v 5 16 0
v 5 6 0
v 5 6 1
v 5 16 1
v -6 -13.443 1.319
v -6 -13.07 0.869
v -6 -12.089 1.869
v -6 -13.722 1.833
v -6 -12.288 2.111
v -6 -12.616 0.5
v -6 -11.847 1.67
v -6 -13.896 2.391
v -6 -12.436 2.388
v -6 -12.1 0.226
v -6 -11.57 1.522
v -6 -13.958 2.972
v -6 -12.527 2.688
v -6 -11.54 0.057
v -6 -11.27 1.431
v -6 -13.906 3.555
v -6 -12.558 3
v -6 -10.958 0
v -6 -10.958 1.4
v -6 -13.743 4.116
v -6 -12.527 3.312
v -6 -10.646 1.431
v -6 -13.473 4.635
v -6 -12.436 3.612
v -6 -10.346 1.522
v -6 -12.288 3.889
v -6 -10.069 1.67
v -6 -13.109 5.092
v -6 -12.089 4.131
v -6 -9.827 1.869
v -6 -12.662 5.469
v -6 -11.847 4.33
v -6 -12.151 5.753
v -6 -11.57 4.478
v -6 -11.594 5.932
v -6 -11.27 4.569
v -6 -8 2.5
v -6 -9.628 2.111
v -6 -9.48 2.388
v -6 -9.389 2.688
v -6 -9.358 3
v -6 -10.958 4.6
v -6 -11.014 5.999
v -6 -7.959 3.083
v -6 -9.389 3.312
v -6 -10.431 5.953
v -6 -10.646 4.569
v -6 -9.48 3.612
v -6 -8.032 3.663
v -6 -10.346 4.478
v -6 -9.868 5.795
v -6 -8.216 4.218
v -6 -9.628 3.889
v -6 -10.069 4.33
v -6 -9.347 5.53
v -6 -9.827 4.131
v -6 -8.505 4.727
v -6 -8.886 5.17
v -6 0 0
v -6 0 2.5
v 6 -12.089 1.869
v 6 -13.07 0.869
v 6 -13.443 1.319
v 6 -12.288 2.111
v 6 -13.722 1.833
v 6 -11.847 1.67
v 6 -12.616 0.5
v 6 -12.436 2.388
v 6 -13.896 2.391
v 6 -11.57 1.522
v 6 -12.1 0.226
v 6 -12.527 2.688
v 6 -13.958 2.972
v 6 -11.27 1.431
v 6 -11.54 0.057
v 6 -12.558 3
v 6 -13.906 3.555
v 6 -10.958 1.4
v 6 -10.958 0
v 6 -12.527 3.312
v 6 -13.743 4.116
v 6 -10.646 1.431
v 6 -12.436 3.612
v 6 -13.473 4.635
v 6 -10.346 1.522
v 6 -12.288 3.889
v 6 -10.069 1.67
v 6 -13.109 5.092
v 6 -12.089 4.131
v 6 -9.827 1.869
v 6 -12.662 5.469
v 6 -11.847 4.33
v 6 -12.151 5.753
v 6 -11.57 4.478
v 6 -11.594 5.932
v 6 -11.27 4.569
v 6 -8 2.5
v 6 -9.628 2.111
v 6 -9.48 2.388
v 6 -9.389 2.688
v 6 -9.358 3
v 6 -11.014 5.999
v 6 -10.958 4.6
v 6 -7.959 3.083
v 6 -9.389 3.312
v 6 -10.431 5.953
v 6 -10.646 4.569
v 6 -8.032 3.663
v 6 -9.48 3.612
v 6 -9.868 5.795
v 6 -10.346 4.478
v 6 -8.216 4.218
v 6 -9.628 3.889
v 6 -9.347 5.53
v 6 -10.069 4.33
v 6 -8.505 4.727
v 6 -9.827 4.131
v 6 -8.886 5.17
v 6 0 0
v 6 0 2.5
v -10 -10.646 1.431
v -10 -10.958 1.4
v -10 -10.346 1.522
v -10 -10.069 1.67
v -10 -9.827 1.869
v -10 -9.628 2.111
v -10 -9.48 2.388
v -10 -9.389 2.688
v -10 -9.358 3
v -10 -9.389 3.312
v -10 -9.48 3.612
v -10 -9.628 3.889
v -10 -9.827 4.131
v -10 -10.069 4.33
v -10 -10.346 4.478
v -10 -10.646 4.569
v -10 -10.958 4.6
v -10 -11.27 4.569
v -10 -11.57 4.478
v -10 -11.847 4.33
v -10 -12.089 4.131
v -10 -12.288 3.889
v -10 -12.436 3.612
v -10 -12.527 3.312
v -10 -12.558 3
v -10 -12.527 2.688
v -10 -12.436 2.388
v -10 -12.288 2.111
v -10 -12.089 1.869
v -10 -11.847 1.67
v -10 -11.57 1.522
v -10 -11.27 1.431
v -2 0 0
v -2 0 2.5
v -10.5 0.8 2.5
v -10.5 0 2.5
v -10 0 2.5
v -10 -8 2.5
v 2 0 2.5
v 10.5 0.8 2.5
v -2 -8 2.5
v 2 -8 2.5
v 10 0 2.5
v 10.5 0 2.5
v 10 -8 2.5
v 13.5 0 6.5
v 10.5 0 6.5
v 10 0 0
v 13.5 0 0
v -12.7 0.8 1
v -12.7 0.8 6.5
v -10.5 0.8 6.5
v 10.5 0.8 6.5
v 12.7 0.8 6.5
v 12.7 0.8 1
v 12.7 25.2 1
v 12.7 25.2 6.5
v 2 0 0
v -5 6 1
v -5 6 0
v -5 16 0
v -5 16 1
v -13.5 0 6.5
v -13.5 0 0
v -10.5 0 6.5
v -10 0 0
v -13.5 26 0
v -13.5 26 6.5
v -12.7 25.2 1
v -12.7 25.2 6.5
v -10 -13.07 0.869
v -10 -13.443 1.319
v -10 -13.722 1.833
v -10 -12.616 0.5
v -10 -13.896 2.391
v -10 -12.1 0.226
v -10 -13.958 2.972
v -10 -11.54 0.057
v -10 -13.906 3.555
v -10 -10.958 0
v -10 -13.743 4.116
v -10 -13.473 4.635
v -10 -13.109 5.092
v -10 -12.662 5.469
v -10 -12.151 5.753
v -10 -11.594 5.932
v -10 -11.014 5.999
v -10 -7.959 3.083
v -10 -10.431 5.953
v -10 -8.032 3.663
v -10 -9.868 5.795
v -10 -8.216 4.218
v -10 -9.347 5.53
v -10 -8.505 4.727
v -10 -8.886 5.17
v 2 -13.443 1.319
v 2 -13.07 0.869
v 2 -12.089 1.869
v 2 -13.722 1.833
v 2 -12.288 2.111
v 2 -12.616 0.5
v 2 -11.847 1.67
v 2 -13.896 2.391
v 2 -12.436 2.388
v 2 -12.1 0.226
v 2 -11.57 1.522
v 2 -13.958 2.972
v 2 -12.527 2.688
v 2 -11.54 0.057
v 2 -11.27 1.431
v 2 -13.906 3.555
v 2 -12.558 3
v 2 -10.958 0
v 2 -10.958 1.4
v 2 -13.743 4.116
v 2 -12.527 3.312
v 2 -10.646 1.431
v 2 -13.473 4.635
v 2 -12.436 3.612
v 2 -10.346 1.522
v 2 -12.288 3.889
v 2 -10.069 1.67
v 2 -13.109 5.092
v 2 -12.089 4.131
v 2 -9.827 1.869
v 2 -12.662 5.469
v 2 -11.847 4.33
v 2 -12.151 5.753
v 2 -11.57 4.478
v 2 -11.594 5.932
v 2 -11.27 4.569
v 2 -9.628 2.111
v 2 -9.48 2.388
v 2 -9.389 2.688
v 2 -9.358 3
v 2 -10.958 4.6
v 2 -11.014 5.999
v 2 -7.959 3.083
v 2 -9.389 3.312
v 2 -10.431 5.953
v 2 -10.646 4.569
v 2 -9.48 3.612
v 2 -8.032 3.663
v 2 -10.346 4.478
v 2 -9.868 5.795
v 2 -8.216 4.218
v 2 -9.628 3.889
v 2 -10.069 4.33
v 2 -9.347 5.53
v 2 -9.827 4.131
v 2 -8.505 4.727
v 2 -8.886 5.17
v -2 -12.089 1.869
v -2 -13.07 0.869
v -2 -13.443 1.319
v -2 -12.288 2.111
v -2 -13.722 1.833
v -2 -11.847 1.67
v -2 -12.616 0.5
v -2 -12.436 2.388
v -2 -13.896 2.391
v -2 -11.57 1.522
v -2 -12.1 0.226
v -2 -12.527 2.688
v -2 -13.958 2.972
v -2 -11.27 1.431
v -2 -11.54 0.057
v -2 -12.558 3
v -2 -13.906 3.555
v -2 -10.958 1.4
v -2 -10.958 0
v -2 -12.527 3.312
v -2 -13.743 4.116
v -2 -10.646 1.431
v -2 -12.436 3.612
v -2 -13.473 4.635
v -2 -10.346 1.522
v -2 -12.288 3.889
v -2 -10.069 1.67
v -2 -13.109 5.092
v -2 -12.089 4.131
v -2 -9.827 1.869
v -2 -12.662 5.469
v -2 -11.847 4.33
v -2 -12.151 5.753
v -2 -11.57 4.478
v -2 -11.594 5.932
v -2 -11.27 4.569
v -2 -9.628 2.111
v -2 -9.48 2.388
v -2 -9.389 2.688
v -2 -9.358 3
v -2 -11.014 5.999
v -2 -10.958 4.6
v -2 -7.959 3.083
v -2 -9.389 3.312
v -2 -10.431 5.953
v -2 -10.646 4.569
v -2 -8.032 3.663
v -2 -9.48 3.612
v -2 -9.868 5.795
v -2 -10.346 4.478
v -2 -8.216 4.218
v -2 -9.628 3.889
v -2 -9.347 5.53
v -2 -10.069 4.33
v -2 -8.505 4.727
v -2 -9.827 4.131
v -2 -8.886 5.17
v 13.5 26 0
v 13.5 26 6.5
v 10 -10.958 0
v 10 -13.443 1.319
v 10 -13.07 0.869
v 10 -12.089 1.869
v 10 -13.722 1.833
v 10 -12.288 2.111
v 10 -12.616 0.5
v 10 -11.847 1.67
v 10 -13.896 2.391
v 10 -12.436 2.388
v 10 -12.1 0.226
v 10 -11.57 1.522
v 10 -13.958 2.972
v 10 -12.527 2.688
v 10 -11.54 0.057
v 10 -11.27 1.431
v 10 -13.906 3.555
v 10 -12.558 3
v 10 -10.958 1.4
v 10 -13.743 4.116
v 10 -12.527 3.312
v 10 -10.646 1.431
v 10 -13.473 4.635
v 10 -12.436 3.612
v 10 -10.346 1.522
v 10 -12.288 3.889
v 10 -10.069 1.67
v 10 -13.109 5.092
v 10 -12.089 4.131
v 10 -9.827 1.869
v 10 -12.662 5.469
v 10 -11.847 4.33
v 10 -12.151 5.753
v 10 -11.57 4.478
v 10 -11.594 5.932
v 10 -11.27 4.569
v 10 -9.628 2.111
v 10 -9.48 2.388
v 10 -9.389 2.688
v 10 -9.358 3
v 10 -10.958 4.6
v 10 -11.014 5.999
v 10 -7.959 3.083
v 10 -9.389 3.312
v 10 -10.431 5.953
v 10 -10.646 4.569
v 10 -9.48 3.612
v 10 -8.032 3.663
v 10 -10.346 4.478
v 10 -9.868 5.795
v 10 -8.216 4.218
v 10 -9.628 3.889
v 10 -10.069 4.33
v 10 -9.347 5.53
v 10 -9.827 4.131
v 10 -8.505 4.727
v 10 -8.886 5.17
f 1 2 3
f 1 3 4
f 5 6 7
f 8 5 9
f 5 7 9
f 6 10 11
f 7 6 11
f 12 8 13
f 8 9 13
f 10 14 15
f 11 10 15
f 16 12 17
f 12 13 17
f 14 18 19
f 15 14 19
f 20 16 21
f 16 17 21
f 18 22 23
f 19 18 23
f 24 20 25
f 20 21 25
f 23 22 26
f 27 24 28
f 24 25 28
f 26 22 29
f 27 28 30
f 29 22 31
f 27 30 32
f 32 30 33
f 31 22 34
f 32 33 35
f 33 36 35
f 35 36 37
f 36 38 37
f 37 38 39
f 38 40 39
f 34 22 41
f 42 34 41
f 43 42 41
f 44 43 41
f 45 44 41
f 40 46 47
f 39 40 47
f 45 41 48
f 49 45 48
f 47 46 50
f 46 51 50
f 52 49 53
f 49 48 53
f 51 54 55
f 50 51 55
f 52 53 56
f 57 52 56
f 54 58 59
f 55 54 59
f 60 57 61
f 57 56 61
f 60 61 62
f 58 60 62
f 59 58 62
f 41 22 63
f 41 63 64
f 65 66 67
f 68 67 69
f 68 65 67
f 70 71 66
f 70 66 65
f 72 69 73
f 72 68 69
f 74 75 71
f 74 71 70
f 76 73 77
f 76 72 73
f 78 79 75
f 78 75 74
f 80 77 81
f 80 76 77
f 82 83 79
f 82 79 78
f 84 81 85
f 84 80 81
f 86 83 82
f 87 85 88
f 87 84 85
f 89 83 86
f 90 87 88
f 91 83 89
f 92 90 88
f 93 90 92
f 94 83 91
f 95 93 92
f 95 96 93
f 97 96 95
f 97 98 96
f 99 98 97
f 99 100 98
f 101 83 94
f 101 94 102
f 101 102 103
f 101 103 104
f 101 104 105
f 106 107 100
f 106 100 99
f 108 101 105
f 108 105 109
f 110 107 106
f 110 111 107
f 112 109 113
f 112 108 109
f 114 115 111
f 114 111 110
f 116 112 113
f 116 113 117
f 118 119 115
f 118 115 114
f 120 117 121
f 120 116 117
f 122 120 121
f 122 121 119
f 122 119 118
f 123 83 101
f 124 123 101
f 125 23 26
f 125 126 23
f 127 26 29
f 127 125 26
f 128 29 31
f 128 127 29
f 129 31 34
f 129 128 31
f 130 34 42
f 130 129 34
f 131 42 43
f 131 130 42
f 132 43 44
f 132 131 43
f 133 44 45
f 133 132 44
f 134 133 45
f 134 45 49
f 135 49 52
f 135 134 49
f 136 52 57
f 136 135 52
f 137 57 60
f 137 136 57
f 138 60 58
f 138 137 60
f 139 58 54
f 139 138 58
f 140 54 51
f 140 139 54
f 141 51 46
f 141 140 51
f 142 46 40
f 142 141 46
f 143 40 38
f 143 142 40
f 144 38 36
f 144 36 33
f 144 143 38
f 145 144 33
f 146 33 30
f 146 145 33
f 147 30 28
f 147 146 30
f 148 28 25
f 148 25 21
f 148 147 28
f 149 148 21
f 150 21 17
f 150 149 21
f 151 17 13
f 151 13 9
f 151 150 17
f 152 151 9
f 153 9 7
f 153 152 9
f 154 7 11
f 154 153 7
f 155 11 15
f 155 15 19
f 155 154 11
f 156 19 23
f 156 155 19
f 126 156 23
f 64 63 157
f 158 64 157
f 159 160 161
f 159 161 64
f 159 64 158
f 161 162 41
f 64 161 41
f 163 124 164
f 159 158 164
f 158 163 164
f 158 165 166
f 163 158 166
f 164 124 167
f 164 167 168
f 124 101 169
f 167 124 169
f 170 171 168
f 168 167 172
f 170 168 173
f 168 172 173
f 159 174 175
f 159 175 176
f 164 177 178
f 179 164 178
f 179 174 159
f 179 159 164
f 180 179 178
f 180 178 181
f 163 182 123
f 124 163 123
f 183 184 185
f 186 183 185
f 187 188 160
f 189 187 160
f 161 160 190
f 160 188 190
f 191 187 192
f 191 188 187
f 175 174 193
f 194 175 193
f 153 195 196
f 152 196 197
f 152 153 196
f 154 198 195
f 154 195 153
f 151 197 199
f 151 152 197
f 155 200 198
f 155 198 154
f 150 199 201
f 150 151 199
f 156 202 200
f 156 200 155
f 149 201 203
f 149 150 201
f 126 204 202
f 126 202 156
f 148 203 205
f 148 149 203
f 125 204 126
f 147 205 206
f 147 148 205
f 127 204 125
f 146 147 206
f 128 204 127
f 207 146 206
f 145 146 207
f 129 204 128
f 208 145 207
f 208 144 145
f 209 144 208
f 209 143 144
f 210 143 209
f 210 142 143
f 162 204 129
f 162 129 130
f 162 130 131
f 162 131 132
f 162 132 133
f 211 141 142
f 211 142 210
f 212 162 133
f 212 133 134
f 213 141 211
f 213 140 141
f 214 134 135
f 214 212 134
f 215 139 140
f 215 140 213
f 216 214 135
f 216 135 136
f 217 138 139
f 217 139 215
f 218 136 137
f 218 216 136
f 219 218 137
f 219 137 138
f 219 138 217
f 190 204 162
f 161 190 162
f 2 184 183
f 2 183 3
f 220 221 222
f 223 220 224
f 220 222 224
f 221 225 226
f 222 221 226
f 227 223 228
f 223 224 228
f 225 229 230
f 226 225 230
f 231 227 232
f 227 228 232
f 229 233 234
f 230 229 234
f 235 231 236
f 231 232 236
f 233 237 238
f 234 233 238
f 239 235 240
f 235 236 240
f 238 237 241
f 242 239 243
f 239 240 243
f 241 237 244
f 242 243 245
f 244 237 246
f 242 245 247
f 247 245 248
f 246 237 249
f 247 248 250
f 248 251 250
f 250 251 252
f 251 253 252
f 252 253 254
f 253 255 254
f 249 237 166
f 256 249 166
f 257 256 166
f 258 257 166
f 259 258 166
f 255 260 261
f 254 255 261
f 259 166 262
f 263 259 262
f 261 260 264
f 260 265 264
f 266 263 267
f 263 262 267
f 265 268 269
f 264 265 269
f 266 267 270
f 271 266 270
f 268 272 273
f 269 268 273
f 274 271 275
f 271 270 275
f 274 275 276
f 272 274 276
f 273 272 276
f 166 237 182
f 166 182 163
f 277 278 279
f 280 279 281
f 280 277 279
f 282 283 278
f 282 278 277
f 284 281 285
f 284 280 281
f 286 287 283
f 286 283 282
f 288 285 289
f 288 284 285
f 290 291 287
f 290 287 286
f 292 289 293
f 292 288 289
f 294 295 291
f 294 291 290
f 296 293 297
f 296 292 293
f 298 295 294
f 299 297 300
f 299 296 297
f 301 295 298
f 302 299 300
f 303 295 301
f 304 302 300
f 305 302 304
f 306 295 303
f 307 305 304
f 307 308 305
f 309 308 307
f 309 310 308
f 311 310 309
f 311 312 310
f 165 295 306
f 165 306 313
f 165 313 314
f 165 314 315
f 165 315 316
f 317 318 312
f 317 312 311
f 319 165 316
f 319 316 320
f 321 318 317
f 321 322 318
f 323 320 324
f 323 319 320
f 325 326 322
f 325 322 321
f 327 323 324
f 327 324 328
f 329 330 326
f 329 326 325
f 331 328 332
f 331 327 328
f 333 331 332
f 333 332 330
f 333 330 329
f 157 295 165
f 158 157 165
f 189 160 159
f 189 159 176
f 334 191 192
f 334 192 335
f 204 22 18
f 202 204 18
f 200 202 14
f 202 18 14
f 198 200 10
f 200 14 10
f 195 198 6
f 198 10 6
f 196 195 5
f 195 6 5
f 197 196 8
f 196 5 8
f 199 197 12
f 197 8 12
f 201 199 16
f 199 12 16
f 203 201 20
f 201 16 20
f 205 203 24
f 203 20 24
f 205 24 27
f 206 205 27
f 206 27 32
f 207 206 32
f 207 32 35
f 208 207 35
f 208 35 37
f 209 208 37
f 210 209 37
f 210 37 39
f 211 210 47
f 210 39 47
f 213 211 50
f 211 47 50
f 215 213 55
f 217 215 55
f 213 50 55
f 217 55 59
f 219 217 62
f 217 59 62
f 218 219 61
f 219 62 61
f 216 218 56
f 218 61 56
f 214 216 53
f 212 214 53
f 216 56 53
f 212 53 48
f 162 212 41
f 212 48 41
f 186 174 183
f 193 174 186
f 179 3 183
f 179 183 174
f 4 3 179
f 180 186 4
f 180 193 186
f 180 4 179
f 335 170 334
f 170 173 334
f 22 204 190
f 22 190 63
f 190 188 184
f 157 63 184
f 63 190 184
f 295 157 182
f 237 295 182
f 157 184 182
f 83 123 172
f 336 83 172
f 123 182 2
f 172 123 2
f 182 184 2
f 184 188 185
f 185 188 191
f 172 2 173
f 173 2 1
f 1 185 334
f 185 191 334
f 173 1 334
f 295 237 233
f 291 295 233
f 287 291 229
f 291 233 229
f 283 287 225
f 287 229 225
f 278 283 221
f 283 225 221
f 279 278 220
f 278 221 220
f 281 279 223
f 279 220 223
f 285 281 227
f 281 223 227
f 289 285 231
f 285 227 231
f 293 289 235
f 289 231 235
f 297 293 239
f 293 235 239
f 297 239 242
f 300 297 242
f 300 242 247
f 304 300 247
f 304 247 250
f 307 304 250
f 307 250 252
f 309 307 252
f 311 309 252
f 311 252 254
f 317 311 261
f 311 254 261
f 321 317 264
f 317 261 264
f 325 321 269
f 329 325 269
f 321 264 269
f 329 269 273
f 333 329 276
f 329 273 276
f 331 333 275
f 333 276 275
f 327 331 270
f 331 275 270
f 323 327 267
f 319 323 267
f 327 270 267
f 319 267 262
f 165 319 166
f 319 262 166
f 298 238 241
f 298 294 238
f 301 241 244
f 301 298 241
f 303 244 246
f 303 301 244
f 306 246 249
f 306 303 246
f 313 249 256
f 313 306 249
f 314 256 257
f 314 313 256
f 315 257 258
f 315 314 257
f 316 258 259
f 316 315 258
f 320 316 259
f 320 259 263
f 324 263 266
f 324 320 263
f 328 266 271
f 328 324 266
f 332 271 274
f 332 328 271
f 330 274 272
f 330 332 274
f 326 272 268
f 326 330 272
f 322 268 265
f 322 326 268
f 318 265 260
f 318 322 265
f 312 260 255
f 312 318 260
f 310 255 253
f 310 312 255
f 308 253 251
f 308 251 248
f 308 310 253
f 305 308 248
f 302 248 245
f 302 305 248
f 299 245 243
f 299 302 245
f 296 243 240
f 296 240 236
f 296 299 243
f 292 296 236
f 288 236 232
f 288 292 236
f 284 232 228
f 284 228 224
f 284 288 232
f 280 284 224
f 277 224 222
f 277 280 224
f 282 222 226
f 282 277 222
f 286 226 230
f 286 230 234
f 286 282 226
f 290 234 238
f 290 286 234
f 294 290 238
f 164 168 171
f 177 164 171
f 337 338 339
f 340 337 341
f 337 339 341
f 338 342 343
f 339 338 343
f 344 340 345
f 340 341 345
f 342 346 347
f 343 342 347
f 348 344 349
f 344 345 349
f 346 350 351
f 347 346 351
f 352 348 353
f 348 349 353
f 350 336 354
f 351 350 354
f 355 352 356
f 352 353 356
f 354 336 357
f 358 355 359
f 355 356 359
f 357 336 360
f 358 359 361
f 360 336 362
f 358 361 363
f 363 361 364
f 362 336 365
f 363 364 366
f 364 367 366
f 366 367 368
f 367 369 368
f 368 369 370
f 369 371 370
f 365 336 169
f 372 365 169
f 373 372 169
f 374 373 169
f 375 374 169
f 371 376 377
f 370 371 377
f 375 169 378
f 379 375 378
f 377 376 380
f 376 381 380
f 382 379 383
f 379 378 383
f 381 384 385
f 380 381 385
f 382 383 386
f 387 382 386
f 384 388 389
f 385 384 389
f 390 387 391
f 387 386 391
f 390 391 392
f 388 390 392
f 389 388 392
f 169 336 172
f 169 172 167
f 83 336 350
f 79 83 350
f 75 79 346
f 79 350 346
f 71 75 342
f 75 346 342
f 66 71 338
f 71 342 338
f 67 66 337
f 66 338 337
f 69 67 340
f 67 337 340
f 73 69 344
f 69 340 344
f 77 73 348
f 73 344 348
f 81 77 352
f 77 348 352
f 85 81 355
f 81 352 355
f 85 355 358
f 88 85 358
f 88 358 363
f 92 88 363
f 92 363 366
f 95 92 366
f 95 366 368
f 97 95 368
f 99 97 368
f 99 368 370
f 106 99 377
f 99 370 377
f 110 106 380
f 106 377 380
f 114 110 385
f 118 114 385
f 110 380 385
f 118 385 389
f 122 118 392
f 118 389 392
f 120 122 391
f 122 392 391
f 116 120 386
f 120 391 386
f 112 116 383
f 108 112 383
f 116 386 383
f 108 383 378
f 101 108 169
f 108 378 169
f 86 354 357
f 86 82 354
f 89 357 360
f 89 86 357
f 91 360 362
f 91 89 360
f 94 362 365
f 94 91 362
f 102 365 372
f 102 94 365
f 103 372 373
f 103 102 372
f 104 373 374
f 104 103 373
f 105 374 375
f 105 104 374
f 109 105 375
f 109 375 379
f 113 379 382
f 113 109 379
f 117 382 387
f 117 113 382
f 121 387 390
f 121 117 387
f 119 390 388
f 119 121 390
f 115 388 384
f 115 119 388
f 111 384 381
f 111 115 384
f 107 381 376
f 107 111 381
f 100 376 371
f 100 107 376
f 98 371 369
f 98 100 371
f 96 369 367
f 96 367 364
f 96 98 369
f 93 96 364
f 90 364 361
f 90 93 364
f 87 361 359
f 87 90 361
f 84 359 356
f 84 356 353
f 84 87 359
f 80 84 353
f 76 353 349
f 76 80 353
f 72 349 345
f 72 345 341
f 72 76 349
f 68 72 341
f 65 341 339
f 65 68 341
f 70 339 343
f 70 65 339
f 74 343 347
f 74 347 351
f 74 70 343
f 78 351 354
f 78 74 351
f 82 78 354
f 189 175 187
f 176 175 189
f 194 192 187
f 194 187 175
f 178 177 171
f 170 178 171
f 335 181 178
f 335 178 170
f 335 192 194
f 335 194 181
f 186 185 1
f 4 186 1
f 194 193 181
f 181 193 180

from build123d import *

# Parameters (mm, degrees)
ESQUISSE1_W                    = 27
ESQUISSE1_H                    = 26
ESQUISSE1_W_2                  = 10
ESQUISSE1_H_2                  = 10
BOSS_EXTRU_1_DEPTH             = 1
ESQUISSE2_W                    = 27
ESQUISSE2_H                    = 26
ESQUISSE2_W_2                  = 25.4
ESQUISSE2_H_2                  = 24.4
BOSS_EXTRU_2_DEPTH             = 5.5
ENL_V_MAT_EXTRU_1_REACH        = 32.008
ESQUISSE3_W                    = 21
ESQUISSE3_H                    = 4
ESQUISSE4_R                    = 1.6
BOSS_EXTRU_3_DEPTH             = 2
R_P_TITION_LIN_AIRE1_COUNT     = 2
R_P_TITION_LIN_AIRE1_PITCH     = 8
R_P_TITION_LIN_AIRE1_COL_COUNT = 2
R_P_TITION_LIN_AIRE1_COL_PITCH = 8


with BuildPart() as part:
    # Esquisse1 → Boss.-Extru.1 (new body)
    with BuildSketch(Plane.XY):
        with Locations((0, 13)):
            Rectangle(ESQUISSE1_W, ESQUISSE1_H)
        with Locations((0, 11)):
            Rectangle(ESQUISSE1_W_2, ESQUISSE1_H_2, mode=Mode.SUBTRACT)
    extrude(amount=BOSS_EXTRU_1_DEPTH)

    # Esquisse2 → Boss.-Extru.2 (add)
    with BuildSketch(Plane.XY.offset(1)):
        with Locations((0, 13)):
            Rectangle(ESQUISSE2_W, ESQUISSE2_H)
        with Locations((0, 13)):
            Rectangle(ESQUISSE2_W_2, ESQUISSE2_H_2, mode=Mode.SUBTRACT)
    extrude(amount=BOSS_EXTRU_2_DEPTH)

    # Esquisse3 → Enlèv. mat.-Extru.1 (cut, up to next)
    with BuildSketch(Plane.XZ, mode=Mode.PRIVATE) as enl_v_mat_extru_1_sk1:
        with Locations((0, 4.5)):
            Rectangle(ESQUISSE3_W, ESQUISSE3_H)
    enl_v_mat_extru_1_tool1 = extrude(enl_v_mat_extru_1_sk1.sketch, amount=-ENL_V_MAT_EXTRU_1_REACH, mode=Mode.PRIVATE) & part.part
    add(enl_v_mat_extru_1_tool1.solids().sort_by_distance((0, 0, 4.5))[0], mode=Mode.SUBTRACT)

    # Esquisse4 → Boss.-Extru.3 (add, symmetric)
    with BuildSketch(Plane(origin=(0, 0, 0), x_dir=(0, 0, -1), z_dir=(1, 0, 0))):
        with BuildLine():
            Line((0, -8), (0, -10.958039892))
            ThreePointArc((0, -10.958039892), (-5.291287847, -12.894531565), (-2.5, -8))
            Line((-2.5, -8), (-2.5, 0))
            Line((-2.5, 0), (0, 0))
            Line((0, 0), (0, -8))
        make_face()
        with Locations((-3, -10.958039892)):
            Circle(ESQUISSE4_R, mode=Mode.SUBTRACT)
    boss_extru_3 = extrude(amount=BOSS_EXTRU_3_DEPTH, both=True)

    # Répétition linéaire1: Boss.-Extru.3 ×2
    with Locations(*[(-i * R_P_TITION_LIN_AIRE1_PITCH, 0, 0) for i in range(1, R_P_TITION_LIN_AIRE1_COUNT)]):
        add(boss_extru_3)

    # Répétition linéaire1 col: Boss.-Extru.3 ×2
    with Locations(*[(i * R_P_TITION_LIN_AIRE1_COL_PITCH, 0, 0) for i in range(1, R_P_TITION_LIN_AIRE1_COL_COUNT)]):
        add(boss_extru_3)


solid = part.part
